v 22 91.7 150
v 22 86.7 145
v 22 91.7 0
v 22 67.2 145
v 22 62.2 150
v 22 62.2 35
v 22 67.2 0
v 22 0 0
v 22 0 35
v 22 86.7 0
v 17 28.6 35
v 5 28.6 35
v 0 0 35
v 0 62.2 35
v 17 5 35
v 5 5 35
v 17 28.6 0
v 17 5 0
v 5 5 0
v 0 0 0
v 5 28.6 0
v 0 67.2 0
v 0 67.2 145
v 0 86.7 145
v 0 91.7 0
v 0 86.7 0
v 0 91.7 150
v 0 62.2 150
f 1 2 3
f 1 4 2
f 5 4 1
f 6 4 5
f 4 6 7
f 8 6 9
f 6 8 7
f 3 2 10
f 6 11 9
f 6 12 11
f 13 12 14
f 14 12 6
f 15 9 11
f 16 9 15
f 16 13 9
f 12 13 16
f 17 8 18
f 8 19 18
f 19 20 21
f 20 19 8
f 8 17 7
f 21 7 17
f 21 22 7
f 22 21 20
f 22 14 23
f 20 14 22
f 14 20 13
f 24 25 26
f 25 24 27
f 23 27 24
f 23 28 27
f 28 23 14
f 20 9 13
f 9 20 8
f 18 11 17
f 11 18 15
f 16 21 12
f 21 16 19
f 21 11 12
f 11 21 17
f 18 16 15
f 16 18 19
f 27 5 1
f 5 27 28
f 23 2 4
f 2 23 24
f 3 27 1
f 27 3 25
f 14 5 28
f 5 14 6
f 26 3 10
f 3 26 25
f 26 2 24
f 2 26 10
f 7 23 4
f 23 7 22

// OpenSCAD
/*
  Landing Rail Dimensions
    Height: ~140.0mm
    Depth: 19.5mm

  Drier Arm Dimensions
    Height: ~70.0mm
    Width: ~12.0mm
    Depth: ~23.6mm
*/

railHeight = 140;
railDepth = 19.5;

armHeight = 30; // We only need to support some of the arm in a through-hole style
armWidth = 12;
armDepth = 23.6;

wallThickness = 5;


// Drier Arm Holder Piece
difference() {
  cube([armWidth + (2 * wallThickness), 2 * (armDepth + (2 * wallThickness)), armHeight + wallThickness]);

  translate([wallThickness, wallThickness, 0]) {
    cube([armWidth, armDepth, armHeight + wallThickness]);
  }
}

// Railing Bracket
translate ([0, (2 * armDepth) + (3 * wallThickness), 0]) {
  cube([armWidth + (2 * wallThickness), wallThickness, railHeight + (2 * wallThickness)]);
  // cube([armWidth + (2 * wallThickness), railDepth + (2 * wallThickness), wallThickness]);

  // translate([0, railDepth + wallThickness, 0]) {
  //   cube([armWidth + (2 * wallThickness), wallThickness, 5 * wallThickness]);
  // }

  translate([0, 0, railHeight + wallThickness]) {
    cube([armWidth + (2 * wallThickness), railDepth + (2 * wallThickness), wallThickness]);

    translate([0, railDepth + wallThickness, -(railHeight + wallThickness)]) {
      cube([armWidth + (2 * wallThickness), wallThickness, railHeight + wallThickness]);
    }
  }
}
